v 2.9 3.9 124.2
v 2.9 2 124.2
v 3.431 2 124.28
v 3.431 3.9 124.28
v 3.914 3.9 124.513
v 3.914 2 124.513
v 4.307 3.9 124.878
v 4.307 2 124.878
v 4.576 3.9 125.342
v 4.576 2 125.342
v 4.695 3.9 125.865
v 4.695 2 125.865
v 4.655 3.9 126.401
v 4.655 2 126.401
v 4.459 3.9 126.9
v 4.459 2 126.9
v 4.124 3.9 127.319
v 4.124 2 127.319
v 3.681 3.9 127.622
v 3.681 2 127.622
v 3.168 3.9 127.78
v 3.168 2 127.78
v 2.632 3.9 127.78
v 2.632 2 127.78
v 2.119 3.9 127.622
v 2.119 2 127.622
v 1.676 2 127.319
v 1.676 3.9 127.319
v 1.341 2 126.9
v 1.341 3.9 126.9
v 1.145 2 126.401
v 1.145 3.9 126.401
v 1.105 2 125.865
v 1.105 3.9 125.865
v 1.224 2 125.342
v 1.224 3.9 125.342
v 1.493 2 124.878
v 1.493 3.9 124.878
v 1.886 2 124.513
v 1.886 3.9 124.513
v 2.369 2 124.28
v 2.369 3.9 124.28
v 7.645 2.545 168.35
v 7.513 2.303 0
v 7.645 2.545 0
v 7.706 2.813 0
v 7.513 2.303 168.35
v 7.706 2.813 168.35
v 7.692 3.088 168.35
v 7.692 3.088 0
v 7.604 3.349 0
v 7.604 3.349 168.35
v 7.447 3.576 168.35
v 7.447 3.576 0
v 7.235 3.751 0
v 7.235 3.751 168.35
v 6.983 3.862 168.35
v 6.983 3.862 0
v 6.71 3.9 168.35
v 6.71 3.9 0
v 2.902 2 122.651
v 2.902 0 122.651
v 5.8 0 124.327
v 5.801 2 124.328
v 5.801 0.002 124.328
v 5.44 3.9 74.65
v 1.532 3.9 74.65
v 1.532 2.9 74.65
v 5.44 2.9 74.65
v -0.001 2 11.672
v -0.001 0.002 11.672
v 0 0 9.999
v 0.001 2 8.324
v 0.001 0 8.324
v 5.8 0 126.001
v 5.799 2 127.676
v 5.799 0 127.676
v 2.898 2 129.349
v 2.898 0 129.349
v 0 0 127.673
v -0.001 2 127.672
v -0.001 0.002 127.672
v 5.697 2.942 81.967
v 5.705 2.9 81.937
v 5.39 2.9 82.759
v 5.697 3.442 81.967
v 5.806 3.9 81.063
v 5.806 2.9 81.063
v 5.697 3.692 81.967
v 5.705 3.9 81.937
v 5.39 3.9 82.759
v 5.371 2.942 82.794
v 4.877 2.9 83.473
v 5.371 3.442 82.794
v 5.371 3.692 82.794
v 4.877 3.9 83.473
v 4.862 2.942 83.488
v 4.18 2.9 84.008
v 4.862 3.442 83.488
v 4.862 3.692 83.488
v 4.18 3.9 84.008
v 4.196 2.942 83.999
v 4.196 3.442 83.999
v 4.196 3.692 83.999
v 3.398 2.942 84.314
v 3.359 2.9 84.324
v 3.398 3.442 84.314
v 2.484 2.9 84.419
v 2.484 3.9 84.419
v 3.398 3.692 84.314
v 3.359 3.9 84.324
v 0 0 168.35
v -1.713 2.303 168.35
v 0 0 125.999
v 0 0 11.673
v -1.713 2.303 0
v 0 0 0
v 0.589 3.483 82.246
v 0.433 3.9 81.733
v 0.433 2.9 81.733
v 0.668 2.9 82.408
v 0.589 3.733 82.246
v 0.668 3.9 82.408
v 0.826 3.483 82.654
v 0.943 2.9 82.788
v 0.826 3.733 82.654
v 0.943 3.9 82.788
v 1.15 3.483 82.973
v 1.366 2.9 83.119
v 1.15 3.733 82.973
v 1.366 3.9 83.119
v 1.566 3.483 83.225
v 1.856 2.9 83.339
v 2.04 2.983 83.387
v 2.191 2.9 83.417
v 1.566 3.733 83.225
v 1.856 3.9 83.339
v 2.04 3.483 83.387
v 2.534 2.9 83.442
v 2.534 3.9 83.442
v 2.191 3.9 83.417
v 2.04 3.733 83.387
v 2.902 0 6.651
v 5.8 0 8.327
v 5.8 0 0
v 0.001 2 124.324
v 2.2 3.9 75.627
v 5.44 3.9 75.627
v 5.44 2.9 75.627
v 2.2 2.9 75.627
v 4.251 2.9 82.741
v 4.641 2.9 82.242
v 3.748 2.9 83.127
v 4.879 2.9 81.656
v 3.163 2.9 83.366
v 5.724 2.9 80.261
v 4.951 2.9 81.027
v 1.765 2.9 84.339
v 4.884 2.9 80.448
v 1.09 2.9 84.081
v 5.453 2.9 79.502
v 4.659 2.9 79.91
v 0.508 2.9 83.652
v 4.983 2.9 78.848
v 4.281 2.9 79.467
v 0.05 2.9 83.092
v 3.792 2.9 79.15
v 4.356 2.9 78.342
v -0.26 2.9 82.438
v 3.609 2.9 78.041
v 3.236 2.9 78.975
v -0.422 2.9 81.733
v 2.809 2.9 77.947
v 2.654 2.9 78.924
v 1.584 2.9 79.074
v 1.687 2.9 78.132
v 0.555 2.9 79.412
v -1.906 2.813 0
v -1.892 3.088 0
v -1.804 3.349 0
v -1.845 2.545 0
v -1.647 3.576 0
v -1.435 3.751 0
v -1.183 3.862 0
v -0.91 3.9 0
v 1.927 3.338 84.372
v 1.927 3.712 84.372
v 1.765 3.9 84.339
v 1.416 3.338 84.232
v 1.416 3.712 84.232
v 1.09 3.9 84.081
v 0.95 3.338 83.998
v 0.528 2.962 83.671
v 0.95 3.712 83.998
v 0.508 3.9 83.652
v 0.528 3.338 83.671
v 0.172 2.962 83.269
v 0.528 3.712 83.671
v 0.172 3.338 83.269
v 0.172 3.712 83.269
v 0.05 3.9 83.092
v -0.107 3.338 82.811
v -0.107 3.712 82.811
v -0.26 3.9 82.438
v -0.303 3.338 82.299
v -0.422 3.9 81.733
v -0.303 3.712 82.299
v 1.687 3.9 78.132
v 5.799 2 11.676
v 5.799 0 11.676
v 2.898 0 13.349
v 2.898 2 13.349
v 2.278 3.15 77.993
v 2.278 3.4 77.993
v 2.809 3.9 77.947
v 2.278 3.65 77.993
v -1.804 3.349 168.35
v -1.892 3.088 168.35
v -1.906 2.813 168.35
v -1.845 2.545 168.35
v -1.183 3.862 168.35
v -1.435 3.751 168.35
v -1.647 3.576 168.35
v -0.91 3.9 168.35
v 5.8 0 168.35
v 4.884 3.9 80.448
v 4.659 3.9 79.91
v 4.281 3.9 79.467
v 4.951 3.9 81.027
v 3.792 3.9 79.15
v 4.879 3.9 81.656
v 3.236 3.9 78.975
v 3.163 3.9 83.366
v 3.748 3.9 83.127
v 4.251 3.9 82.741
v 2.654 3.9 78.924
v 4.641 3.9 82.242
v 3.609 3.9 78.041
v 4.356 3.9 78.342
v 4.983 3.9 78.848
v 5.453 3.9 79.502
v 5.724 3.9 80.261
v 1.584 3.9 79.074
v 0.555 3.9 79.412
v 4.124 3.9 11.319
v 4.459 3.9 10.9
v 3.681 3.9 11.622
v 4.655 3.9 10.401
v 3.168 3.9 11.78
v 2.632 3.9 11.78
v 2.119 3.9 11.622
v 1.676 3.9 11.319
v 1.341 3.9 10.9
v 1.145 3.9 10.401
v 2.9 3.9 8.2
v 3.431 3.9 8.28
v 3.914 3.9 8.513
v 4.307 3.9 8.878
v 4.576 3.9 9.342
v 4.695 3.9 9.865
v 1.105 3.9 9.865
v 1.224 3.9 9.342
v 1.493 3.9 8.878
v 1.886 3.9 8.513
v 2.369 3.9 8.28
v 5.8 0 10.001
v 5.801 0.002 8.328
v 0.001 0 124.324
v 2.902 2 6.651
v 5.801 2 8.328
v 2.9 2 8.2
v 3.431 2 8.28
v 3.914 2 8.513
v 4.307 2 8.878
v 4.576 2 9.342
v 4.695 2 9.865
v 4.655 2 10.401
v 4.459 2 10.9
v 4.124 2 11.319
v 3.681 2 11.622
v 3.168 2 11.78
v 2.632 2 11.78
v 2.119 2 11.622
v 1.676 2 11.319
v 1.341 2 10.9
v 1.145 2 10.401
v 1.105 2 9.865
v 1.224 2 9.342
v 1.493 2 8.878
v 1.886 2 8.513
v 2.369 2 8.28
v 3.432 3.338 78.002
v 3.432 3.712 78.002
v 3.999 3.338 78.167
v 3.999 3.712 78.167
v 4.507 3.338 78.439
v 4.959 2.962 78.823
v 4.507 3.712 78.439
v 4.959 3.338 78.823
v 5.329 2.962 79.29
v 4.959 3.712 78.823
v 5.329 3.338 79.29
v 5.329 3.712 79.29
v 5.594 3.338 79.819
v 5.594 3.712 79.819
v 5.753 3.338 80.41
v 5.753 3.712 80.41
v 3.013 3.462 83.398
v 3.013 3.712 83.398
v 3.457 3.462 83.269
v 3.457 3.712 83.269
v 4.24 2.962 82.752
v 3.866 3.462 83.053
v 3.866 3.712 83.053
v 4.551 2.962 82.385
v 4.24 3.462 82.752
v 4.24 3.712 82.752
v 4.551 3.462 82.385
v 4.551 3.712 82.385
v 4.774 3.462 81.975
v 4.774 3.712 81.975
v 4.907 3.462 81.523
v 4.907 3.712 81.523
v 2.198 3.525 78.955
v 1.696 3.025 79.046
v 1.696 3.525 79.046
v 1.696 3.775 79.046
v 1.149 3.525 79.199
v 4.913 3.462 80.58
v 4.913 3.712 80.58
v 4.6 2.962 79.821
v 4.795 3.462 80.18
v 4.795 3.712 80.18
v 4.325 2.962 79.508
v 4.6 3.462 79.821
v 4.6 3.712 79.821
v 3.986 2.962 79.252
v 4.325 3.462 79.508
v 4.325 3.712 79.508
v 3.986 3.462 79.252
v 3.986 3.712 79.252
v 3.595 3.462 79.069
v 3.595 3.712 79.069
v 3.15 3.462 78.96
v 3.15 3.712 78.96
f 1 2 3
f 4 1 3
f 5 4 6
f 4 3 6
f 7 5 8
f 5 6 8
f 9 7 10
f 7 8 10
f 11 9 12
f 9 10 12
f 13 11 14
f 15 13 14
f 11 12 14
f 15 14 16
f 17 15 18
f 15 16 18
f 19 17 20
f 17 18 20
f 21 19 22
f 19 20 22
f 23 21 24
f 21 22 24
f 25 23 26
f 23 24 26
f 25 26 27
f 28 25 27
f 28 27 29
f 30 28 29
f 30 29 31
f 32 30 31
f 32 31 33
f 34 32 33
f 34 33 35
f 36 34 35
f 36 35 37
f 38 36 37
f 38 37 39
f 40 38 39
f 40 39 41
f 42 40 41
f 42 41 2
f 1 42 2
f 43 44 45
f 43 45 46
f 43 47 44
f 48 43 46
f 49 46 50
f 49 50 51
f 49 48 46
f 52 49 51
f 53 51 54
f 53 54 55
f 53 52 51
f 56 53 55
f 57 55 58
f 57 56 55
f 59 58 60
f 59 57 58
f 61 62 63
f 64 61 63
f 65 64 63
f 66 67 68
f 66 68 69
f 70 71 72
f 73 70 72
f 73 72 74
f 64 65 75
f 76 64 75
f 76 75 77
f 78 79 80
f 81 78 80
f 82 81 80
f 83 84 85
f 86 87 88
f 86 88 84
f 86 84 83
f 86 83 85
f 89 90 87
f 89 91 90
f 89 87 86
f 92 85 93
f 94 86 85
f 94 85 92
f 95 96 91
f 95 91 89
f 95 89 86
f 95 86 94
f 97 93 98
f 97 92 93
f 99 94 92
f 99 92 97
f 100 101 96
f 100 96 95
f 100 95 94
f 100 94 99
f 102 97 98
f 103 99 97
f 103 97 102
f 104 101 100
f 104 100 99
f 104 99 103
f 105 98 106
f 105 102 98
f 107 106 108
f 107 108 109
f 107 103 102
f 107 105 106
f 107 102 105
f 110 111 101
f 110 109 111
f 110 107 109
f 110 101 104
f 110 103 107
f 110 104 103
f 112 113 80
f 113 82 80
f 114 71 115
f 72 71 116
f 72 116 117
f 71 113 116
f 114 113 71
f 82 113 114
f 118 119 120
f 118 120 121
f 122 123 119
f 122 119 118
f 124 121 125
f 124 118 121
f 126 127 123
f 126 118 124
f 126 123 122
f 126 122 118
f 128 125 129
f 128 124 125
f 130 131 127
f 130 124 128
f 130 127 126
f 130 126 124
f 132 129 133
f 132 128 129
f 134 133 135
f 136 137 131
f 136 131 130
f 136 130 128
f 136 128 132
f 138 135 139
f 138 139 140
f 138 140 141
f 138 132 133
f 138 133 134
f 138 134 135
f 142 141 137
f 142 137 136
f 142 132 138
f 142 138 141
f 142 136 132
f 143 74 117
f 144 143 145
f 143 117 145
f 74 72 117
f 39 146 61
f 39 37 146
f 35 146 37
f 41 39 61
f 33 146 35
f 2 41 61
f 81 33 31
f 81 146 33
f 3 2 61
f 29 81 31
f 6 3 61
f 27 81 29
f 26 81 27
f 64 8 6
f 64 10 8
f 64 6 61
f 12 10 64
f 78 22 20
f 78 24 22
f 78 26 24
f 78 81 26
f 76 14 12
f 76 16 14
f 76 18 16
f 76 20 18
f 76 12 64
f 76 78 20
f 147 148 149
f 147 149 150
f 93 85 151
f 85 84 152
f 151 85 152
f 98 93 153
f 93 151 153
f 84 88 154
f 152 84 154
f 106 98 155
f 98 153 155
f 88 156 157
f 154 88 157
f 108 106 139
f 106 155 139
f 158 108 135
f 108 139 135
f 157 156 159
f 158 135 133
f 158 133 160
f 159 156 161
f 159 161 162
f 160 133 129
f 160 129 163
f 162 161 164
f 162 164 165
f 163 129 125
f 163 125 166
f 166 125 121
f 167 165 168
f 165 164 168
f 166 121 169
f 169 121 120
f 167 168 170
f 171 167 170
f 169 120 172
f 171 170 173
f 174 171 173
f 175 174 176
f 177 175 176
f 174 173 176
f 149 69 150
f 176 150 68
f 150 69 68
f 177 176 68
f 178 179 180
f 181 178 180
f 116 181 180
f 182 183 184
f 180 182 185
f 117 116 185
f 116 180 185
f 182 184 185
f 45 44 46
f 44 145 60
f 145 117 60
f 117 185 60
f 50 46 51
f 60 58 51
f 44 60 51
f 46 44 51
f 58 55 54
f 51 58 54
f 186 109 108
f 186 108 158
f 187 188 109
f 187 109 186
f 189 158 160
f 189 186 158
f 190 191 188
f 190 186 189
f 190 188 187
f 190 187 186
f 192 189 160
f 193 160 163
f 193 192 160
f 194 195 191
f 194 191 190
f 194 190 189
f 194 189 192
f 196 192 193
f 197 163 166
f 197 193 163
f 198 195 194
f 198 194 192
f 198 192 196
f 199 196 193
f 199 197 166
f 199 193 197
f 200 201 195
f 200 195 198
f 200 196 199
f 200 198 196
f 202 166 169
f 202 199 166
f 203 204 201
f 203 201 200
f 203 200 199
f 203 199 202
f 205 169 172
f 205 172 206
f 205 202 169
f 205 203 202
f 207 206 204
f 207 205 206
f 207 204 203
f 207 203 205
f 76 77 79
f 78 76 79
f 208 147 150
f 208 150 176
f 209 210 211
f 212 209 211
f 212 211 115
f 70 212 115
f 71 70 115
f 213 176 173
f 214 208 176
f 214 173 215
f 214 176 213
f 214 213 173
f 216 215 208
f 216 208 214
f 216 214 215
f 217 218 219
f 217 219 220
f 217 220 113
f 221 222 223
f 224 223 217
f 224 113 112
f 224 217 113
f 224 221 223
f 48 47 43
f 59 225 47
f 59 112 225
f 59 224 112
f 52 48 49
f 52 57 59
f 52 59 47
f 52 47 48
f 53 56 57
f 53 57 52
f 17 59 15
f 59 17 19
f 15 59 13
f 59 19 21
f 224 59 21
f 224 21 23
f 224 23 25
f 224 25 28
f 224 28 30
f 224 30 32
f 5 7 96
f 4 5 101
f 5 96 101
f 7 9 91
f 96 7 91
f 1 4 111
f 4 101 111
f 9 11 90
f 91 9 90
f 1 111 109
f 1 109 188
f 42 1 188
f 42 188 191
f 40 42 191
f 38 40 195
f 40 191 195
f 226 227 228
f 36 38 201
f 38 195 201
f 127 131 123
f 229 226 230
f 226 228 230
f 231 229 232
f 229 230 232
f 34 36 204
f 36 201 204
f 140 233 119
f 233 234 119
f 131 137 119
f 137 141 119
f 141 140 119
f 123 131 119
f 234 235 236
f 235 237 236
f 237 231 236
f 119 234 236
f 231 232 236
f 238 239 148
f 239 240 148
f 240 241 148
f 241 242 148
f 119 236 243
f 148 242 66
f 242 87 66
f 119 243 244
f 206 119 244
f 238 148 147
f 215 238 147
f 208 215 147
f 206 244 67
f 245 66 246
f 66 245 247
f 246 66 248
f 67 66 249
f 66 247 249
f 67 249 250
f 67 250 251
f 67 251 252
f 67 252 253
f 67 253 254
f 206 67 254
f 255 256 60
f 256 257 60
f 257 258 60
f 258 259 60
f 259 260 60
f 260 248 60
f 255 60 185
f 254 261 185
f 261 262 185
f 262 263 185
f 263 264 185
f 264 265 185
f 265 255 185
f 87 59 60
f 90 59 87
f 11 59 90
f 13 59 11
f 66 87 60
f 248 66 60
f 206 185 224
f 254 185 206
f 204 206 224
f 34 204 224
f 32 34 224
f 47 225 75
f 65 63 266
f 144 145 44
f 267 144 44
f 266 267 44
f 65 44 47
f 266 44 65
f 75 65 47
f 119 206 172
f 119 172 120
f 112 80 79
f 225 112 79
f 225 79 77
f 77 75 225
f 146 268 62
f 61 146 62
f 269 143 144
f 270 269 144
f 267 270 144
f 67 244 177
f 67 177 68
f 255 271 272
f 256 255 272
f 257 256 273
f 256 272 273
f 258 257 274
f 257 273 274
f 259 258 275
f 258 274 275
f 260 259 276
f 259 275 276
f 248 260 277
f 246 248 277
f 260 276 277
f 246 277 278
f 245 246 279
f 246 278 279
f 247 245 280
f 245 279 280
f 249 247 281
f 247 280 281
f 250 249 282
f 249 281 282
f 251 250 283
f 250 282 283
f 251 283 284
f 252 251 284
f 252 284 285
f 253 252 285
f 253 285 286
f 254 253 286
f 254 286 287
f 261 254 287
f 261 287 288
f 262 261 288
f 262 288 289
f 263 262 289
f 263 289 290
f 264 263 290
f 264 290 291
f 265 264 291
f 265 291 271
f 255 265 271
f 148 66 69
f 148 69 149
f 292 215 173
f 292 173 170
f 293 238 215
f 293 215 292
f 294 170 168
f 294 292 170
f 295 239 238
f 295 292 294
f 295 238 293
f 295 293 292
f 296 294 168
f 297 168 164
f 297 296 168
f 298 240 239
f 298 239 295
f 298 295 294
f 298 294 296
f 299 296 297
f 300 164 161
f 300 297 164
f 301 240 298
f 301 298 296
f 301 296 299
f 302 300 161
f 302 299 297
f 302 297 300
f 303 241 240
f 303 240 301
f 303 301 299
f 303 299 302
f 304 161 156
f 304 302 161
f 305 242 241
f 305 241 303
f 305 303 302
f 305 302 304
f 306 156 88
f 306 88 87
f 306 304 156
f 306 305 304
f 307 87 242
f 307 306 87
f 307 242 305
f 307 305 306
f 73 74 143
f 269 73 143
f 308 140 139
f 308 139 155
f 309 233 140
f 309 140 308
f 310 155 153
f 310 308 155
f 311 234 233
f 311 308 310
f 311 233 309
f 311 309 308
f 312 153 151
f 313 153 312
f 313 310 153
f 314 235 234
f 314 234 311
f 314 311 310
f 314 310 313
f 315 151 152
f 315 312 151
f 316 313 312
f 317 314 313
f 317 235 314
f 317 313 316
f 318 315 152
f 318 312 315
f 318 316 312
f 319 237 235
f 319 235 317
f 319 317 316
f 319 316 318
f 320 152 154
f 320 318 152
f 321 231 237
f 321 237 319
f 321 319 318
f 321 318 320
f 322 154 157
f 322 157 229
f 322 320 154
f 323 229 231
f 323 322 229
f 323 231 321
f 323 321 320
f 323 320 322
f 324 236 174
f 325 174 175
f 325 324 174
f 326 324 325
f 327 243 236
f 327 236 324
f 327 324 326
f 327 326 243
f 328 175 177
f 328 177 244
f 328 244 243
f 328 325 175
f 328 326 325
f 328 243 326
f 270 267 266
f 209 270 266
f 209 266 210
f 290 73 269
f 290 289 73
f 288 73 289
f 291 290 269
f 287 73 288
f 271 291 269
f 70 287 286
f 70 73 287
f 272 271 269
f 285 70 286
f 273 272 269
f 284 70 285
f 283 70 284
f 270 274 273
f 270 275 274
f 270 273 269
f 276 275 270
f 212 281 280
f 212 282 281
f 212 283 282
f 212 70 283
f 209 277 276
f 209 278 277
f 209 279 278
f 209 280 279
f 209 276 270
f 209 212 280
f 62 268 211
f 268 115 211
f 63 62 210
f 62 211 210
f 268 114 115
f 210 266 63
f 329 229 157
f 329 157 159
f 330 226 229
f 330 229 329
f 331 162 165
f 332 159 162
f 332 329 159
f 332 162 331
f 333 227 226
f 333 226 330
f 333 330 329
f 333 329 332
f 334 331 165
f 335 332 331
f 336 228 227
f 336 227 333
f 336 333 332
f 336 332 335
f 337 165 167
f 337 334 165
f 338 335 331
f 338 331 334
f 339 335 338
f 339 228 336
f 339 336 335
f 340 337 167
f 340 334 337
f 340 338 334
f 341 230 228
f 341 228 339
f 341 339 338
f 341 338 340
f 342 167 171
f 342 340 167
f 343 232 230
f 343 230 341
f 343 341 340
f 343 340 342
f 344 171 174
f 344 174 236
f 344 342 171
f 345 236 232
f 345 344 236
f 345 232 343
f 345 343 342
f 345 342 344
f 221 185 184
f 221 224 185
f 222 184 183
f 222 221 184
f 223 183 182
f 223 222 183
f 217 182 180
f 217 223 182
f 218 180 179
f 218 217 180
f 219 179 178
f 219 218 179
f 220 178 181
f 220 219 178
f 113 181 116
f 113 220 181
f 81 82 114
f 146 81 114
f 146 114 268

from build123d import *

# Parameters (mm, degrees)
BOSS_EXTRUDE1_DEPTH = 168.35
FILLET1_R           = 1
SKETCH2_R           = 1.8
CUT_EXTRUDE1_DEPTH  = 200
CUT_EXTRUDE2_DEPTH  = 2
LPATTERN1_COUNT     = 3
LPATTERN1_PITCH     = 116
CUT_EXTRUDE3_DEPTH  = 1


with BuildPart() as part:
    # Sketch1 → Boss-Extrude1 (new body)
    with BuildSketch(Plane.XY):
        Polygon((0, 0), (5.8, 0), (8.7, 3.9), (-2.9, 3.9), align=None)
    extrude(amount=BOSS_EXTRUDE1_DEPTH)

    # Fillet1
    fillet1_edges = [part.edges().sort_by_distance(p)[0] for p in [
        (-2.9, 3.9, 84.175),
        (8.7, 3.9, 84.175),
    ]]
    fillet(fillet1_edges, radius=FILLET1_R)

    # Sketch2 → Cut-Extrude1 (cut)
    with BuildSketch(Plane.XZ):
        with Locations(Location((2.9, 126, 0), (0, 0, 270))):
            Circle(SKETCH2_R)
    cut_extrude1 = extrude(amount=-CUT_EXTRUDE1_DEPTH, mode=Mode.SUBTRACT)

    # Sketch3 → Cut-Extrude2 (cut)
    with BuildSketch(Plane.XZ):
        Polygon((2.902268292, 122.651369207), (5.80113348, 124.327649002), (5.798865189, 127.676279795), (2.897731708, 129.348630793), (-0.00113348, 127.672350998), (0.001134811, 124.323720205), align=None)
    cut_extrude2 = extrude(amount=-CUT_EXTRUDE2_DEPTH, mode=Mode.SUBTRACT)

    # LPattern1: Cut-Extrude1, Cut-Extrude2 ×3
    with Locations(*[(0, 0, -i * LPATTERN1_PITCH) for i in range(1, LPATTERN1_COUNT)]):
        add(cut_extrude1, mode=Mode.SUBTRACT)
        add(cut_extrude2, mode=Mode.SUBTRACT)

    # Sketch4 → Cut-Extrude3 (cut)
    with BuildSketch(Plane(origin=(0, 3.9, 0), x_dir=(1, 0, 0), z_dir=(0, 1, 0))):
        with BuildLine():
            Line((5.439754142, -74.65), (5.439754142, -75.626923077))
            Line((5.439754142, -75.626923077), (2.199880343, -75.626923077))
            Line((2.199880343, -75.626923077), (1.686614118, -78.132196514))
            add(Edge.make_bspline(
                [(1.686614118, -78.132196514), (1.787459033, -78.10435556), (1.982830106, -78.050418115), (2.271192299, -77.990530983), (2.544946796, -77.954430025), (2.722589054, -77.949500672), (2.808549214, -77.947115385)],
                knots=[0, 0, 0, 0, 1.100273476, 2.13160584, 3.095893838, 4, 4, 4, 4], degree=3))
            add(Edge.make_bspline(
                [(2.808549214, -77.947115385), (2.91491282, -77.949417538), (3.124050244, -77.953944147), (3.430044807, -77.997410395), (3.722143609, -78.065826877), (3.999735773, -78.161404868), (4.263334843, -78.283623499), (4.510515564, -78.43629548), (4.74498817, -78.614639759), (4.96254623, -78.819685828), (5.159915954, -79.045351085), (5.33345054, -79.287987862), (5.480850161, -79.545238143), (5.599397644, -79.819559799), (5.694060725, -80.107920067), (5.757067225, -80.413353024), (5.799022697, -80.732979693), (5.803710049, -80.951522845), (5.806100295, -81.062965745)],
                knots=[0, 0, 0, 0, 1.052922333, 2.070308379, 3.05430497, 4.020497103, 4.973039431, 5.925935799, 6.892292201, 7.88610001, 8.88166317, 9.857072816, 10.836096531, 11.812156883, 12.81219415, 13.836441305, 14.89672472, 16, 16, 16, 16], degree=3))
            add(Edge.make_bspline(
                [(5.806100295, -81.062965745), (5.804290341, -81.140586931), (5.800694891, -81.294780318), (5.782410734, -81.52377275), (5.747207107, -81.747917317), (5.699942087, -81.967243755), (5.638594506, -82.181336832), (5.564329295, -82.390809347), (5.473444392, -82.594357527), (5.373754721, -82.793907352), (5.261505377, -82.984947575), (5.136922439, -83.163606603), (5.005299209, -83.332564541), (4.863672296, -83.490009343), (4.710725302, -83.634906413), (4.548310535, -83.768115664), (4.377723993, -83.891889856), (4.196326512, -84.00120473), (4.008160183, -84.101796775), (3.810507678, -84.184320116), (3.6078682, -84.258099482), (3.397325217, -84.316908268), (3.179355627, -84.362989005), (2.953600131, -84.394287068), (2.721242736, -84.417082945), (2.563740024, -84.418509945), (2.484180223, -84.419230769)],
                knots=[0, 0, 0, 0, 1.056347294, 2.098418968, 3.122841568, 4.141288669, 5.149314143, 6.15115421, 7.162517403, 8.180376062, 9.185164535, 10.17417709, 11.141909838, 12.097768115, 13.052685741, 14.0056014, 14.954263652, 15.917497458, 16.885230207, 17.854509472, 18.828990115, 19.81800267, 20.826176721, 21.857883937, 22.917946725, 24, 24, 24, 24], degree=3))
            add(Edge.make_bspline(
                [(2.484180223, -84.419230769), (2.389272632, -84.417350703), (2.202553157, -84.413651895), (1.928993613, -84.374957303), (1.665791722, -84.319538359), (1.415066233, -84.236163939), (1.174570151, -84.131695658), (0.947541183, -83.999662363), (0.728178321, -83.850040659), (0.525399135, -83.673473413), (0.337195712, -83.48048145), (0.16872157, -83.271046726), (0.018679479, -83.048625887), (-0.110527818, -82.812138768), (-0.22074029, -82.562206766), (-0.307322508, -82.297893456), (-0.377204317, -82.020579874), (-0.40676834, -81.829662107), (-0.42178432, -81.732692308)],
                knots=[0, 0, 0, 0, 1.0467383, 2.05933395, 3.04377827, 4.011590433, 4.970194871, 5.932262533, 6.905835911, 7.896367577, 8.894135286, 9.877477877, 10.858688626, 11.851381753, 12.8477658, 13.868841284, 14.917554742, 16, 16, 16, 16], degree=3))
            Line((-0.42178432, -81.732692308), (0.433023372, -81.732692308))
            add(Edge.make_bspline(
                [(0.433023372, -81.732692308), (0.454056089, -81.823523939), (0.494482139, -81.998107378), (0.583216355, -82.243393385), (0.691708488, -82.461976416), (0.820716036, -82.656747924), (0.974612905, -82.826589553), (1.150225136, -82.977947414), (1.347114297, -83.114495445), (1.565898729, -83.228313118), (1.796711466, -83.325383083), (2.038285088, -83.390021624), (2.284041916, -83.435471911), (2.450262338, -83.440021489), (2.533789598, -83.442307692)],
                knots=[0, 0, 0, 0, 1.136247022, 2.183929868, 3.172523383, 4.106158343, 5.02341133, 5.958108904, 6.928429099, 7.938127109, 8.96079061, 9.975095812, 10.982467395, 12, 12, 12, 12], degree=3))
            add(Edge.make_bspline(
                [(2.533789598, -83.442307692), (2.615319365, -83.440074004), (2.775852142, -83.435675853), (3.01210313, -83.40182397), (3.240193881, -83.349688008), (3.457873759, -83.271665046), (3.668951949, -83.176837633), (3.868089138, -83.055148749), (4.061046254, -82.915103984), (4.241825675, -82.754657727), (4.40739589, -82.577847343), (4.553689334, -82.38876958), (4.675546506, -82.187065876), (4.778237188, -81.976228224), (4.856215094, -81.753945865), (4.911843764, -81.521260524), (4.944509231, -81.277597471), (4.9490028, -81.111401706), (4.951292603, -81.02671274)],
                knots=[0, 0, 0, 0, 1.027316725, 2.022795036, 3.002884548, 3.971462791, 4.93288096, 5.914575861, 6.907176829, 7.935150275, 8.956128384, 9.956726525, 10.942570165, 11.921478529, 12.907843606, 13.90538589, 14.932640048, 16, 16, 16, 16], degree=3))
            add(Edge.make_bspline(
                [(4.951292603, -81.02671274), (4.949500598, -80.950306588), (4.945993004, -80.800752415), (4.917334809, -80.581951718), (4.867486477, -80.374924367), (4.798297204, -80.17867063), (4.710450829, -79.993005405), (4.603100508, -79.817737077), (4.474231618, -79.655175717), (4.327024407, -79.505245267), (4.165757881, -79.366874572), (3.98765741, -79.248916737), (3.796450038, -79.149682789), (3.594439485, -79.064044879), (3.376820725, -79.002538565), (3.147903318, -78.956361677), (2.905215278, -78.929649869), (2.739287905, -78.925943587), (2.65399693, -78.924038462)],
                knots=[0, 0, 0, 0, 1.045622112, 2.046656509, 3.013763289, 3.955457236, 4.890082067, 5.820317437, 6.762574623, 7.722996705, 8.69280354, 9.665887285, 10.63943826, 11.638615906, 12.663482002, 13.728887084, 14.832589034, 16, 16, 16, 16], degree=3))
            add(Edge.make_bspline(
                [(2.65399693, -78.924038462), (2.580167488, -78.925618499), (2.427728421, -78.928880875), (2.193895585, -78.952901556), (1.948173111, -78.991652779), (1.691502948, -79.044955352), (1.423114279, -79.114708497), (1.143573489, -79.198295816), (0.85229282, -79.298232113), (0.656029585, -79.373703352), (0.555138757, -79.4125)],
                knots=[0, 0, 0, 0, 0.817624296, 1.688186739, 2.600797293, 3.572016777, 4.590301741, 5.671205678, 6.80286297, 8, 8, 8, 8], degree=3))
            Line((0.555138757, -79.4125), (1.532061834, -74.65))
            Line((1.532061834, -74.65), (5.439754142, -74.65))
        make_face()
    extrude(amount=-CUT_EXTRUDE3_DEPTH, mode=Mode.SUBTRACT)


solid = part.part
